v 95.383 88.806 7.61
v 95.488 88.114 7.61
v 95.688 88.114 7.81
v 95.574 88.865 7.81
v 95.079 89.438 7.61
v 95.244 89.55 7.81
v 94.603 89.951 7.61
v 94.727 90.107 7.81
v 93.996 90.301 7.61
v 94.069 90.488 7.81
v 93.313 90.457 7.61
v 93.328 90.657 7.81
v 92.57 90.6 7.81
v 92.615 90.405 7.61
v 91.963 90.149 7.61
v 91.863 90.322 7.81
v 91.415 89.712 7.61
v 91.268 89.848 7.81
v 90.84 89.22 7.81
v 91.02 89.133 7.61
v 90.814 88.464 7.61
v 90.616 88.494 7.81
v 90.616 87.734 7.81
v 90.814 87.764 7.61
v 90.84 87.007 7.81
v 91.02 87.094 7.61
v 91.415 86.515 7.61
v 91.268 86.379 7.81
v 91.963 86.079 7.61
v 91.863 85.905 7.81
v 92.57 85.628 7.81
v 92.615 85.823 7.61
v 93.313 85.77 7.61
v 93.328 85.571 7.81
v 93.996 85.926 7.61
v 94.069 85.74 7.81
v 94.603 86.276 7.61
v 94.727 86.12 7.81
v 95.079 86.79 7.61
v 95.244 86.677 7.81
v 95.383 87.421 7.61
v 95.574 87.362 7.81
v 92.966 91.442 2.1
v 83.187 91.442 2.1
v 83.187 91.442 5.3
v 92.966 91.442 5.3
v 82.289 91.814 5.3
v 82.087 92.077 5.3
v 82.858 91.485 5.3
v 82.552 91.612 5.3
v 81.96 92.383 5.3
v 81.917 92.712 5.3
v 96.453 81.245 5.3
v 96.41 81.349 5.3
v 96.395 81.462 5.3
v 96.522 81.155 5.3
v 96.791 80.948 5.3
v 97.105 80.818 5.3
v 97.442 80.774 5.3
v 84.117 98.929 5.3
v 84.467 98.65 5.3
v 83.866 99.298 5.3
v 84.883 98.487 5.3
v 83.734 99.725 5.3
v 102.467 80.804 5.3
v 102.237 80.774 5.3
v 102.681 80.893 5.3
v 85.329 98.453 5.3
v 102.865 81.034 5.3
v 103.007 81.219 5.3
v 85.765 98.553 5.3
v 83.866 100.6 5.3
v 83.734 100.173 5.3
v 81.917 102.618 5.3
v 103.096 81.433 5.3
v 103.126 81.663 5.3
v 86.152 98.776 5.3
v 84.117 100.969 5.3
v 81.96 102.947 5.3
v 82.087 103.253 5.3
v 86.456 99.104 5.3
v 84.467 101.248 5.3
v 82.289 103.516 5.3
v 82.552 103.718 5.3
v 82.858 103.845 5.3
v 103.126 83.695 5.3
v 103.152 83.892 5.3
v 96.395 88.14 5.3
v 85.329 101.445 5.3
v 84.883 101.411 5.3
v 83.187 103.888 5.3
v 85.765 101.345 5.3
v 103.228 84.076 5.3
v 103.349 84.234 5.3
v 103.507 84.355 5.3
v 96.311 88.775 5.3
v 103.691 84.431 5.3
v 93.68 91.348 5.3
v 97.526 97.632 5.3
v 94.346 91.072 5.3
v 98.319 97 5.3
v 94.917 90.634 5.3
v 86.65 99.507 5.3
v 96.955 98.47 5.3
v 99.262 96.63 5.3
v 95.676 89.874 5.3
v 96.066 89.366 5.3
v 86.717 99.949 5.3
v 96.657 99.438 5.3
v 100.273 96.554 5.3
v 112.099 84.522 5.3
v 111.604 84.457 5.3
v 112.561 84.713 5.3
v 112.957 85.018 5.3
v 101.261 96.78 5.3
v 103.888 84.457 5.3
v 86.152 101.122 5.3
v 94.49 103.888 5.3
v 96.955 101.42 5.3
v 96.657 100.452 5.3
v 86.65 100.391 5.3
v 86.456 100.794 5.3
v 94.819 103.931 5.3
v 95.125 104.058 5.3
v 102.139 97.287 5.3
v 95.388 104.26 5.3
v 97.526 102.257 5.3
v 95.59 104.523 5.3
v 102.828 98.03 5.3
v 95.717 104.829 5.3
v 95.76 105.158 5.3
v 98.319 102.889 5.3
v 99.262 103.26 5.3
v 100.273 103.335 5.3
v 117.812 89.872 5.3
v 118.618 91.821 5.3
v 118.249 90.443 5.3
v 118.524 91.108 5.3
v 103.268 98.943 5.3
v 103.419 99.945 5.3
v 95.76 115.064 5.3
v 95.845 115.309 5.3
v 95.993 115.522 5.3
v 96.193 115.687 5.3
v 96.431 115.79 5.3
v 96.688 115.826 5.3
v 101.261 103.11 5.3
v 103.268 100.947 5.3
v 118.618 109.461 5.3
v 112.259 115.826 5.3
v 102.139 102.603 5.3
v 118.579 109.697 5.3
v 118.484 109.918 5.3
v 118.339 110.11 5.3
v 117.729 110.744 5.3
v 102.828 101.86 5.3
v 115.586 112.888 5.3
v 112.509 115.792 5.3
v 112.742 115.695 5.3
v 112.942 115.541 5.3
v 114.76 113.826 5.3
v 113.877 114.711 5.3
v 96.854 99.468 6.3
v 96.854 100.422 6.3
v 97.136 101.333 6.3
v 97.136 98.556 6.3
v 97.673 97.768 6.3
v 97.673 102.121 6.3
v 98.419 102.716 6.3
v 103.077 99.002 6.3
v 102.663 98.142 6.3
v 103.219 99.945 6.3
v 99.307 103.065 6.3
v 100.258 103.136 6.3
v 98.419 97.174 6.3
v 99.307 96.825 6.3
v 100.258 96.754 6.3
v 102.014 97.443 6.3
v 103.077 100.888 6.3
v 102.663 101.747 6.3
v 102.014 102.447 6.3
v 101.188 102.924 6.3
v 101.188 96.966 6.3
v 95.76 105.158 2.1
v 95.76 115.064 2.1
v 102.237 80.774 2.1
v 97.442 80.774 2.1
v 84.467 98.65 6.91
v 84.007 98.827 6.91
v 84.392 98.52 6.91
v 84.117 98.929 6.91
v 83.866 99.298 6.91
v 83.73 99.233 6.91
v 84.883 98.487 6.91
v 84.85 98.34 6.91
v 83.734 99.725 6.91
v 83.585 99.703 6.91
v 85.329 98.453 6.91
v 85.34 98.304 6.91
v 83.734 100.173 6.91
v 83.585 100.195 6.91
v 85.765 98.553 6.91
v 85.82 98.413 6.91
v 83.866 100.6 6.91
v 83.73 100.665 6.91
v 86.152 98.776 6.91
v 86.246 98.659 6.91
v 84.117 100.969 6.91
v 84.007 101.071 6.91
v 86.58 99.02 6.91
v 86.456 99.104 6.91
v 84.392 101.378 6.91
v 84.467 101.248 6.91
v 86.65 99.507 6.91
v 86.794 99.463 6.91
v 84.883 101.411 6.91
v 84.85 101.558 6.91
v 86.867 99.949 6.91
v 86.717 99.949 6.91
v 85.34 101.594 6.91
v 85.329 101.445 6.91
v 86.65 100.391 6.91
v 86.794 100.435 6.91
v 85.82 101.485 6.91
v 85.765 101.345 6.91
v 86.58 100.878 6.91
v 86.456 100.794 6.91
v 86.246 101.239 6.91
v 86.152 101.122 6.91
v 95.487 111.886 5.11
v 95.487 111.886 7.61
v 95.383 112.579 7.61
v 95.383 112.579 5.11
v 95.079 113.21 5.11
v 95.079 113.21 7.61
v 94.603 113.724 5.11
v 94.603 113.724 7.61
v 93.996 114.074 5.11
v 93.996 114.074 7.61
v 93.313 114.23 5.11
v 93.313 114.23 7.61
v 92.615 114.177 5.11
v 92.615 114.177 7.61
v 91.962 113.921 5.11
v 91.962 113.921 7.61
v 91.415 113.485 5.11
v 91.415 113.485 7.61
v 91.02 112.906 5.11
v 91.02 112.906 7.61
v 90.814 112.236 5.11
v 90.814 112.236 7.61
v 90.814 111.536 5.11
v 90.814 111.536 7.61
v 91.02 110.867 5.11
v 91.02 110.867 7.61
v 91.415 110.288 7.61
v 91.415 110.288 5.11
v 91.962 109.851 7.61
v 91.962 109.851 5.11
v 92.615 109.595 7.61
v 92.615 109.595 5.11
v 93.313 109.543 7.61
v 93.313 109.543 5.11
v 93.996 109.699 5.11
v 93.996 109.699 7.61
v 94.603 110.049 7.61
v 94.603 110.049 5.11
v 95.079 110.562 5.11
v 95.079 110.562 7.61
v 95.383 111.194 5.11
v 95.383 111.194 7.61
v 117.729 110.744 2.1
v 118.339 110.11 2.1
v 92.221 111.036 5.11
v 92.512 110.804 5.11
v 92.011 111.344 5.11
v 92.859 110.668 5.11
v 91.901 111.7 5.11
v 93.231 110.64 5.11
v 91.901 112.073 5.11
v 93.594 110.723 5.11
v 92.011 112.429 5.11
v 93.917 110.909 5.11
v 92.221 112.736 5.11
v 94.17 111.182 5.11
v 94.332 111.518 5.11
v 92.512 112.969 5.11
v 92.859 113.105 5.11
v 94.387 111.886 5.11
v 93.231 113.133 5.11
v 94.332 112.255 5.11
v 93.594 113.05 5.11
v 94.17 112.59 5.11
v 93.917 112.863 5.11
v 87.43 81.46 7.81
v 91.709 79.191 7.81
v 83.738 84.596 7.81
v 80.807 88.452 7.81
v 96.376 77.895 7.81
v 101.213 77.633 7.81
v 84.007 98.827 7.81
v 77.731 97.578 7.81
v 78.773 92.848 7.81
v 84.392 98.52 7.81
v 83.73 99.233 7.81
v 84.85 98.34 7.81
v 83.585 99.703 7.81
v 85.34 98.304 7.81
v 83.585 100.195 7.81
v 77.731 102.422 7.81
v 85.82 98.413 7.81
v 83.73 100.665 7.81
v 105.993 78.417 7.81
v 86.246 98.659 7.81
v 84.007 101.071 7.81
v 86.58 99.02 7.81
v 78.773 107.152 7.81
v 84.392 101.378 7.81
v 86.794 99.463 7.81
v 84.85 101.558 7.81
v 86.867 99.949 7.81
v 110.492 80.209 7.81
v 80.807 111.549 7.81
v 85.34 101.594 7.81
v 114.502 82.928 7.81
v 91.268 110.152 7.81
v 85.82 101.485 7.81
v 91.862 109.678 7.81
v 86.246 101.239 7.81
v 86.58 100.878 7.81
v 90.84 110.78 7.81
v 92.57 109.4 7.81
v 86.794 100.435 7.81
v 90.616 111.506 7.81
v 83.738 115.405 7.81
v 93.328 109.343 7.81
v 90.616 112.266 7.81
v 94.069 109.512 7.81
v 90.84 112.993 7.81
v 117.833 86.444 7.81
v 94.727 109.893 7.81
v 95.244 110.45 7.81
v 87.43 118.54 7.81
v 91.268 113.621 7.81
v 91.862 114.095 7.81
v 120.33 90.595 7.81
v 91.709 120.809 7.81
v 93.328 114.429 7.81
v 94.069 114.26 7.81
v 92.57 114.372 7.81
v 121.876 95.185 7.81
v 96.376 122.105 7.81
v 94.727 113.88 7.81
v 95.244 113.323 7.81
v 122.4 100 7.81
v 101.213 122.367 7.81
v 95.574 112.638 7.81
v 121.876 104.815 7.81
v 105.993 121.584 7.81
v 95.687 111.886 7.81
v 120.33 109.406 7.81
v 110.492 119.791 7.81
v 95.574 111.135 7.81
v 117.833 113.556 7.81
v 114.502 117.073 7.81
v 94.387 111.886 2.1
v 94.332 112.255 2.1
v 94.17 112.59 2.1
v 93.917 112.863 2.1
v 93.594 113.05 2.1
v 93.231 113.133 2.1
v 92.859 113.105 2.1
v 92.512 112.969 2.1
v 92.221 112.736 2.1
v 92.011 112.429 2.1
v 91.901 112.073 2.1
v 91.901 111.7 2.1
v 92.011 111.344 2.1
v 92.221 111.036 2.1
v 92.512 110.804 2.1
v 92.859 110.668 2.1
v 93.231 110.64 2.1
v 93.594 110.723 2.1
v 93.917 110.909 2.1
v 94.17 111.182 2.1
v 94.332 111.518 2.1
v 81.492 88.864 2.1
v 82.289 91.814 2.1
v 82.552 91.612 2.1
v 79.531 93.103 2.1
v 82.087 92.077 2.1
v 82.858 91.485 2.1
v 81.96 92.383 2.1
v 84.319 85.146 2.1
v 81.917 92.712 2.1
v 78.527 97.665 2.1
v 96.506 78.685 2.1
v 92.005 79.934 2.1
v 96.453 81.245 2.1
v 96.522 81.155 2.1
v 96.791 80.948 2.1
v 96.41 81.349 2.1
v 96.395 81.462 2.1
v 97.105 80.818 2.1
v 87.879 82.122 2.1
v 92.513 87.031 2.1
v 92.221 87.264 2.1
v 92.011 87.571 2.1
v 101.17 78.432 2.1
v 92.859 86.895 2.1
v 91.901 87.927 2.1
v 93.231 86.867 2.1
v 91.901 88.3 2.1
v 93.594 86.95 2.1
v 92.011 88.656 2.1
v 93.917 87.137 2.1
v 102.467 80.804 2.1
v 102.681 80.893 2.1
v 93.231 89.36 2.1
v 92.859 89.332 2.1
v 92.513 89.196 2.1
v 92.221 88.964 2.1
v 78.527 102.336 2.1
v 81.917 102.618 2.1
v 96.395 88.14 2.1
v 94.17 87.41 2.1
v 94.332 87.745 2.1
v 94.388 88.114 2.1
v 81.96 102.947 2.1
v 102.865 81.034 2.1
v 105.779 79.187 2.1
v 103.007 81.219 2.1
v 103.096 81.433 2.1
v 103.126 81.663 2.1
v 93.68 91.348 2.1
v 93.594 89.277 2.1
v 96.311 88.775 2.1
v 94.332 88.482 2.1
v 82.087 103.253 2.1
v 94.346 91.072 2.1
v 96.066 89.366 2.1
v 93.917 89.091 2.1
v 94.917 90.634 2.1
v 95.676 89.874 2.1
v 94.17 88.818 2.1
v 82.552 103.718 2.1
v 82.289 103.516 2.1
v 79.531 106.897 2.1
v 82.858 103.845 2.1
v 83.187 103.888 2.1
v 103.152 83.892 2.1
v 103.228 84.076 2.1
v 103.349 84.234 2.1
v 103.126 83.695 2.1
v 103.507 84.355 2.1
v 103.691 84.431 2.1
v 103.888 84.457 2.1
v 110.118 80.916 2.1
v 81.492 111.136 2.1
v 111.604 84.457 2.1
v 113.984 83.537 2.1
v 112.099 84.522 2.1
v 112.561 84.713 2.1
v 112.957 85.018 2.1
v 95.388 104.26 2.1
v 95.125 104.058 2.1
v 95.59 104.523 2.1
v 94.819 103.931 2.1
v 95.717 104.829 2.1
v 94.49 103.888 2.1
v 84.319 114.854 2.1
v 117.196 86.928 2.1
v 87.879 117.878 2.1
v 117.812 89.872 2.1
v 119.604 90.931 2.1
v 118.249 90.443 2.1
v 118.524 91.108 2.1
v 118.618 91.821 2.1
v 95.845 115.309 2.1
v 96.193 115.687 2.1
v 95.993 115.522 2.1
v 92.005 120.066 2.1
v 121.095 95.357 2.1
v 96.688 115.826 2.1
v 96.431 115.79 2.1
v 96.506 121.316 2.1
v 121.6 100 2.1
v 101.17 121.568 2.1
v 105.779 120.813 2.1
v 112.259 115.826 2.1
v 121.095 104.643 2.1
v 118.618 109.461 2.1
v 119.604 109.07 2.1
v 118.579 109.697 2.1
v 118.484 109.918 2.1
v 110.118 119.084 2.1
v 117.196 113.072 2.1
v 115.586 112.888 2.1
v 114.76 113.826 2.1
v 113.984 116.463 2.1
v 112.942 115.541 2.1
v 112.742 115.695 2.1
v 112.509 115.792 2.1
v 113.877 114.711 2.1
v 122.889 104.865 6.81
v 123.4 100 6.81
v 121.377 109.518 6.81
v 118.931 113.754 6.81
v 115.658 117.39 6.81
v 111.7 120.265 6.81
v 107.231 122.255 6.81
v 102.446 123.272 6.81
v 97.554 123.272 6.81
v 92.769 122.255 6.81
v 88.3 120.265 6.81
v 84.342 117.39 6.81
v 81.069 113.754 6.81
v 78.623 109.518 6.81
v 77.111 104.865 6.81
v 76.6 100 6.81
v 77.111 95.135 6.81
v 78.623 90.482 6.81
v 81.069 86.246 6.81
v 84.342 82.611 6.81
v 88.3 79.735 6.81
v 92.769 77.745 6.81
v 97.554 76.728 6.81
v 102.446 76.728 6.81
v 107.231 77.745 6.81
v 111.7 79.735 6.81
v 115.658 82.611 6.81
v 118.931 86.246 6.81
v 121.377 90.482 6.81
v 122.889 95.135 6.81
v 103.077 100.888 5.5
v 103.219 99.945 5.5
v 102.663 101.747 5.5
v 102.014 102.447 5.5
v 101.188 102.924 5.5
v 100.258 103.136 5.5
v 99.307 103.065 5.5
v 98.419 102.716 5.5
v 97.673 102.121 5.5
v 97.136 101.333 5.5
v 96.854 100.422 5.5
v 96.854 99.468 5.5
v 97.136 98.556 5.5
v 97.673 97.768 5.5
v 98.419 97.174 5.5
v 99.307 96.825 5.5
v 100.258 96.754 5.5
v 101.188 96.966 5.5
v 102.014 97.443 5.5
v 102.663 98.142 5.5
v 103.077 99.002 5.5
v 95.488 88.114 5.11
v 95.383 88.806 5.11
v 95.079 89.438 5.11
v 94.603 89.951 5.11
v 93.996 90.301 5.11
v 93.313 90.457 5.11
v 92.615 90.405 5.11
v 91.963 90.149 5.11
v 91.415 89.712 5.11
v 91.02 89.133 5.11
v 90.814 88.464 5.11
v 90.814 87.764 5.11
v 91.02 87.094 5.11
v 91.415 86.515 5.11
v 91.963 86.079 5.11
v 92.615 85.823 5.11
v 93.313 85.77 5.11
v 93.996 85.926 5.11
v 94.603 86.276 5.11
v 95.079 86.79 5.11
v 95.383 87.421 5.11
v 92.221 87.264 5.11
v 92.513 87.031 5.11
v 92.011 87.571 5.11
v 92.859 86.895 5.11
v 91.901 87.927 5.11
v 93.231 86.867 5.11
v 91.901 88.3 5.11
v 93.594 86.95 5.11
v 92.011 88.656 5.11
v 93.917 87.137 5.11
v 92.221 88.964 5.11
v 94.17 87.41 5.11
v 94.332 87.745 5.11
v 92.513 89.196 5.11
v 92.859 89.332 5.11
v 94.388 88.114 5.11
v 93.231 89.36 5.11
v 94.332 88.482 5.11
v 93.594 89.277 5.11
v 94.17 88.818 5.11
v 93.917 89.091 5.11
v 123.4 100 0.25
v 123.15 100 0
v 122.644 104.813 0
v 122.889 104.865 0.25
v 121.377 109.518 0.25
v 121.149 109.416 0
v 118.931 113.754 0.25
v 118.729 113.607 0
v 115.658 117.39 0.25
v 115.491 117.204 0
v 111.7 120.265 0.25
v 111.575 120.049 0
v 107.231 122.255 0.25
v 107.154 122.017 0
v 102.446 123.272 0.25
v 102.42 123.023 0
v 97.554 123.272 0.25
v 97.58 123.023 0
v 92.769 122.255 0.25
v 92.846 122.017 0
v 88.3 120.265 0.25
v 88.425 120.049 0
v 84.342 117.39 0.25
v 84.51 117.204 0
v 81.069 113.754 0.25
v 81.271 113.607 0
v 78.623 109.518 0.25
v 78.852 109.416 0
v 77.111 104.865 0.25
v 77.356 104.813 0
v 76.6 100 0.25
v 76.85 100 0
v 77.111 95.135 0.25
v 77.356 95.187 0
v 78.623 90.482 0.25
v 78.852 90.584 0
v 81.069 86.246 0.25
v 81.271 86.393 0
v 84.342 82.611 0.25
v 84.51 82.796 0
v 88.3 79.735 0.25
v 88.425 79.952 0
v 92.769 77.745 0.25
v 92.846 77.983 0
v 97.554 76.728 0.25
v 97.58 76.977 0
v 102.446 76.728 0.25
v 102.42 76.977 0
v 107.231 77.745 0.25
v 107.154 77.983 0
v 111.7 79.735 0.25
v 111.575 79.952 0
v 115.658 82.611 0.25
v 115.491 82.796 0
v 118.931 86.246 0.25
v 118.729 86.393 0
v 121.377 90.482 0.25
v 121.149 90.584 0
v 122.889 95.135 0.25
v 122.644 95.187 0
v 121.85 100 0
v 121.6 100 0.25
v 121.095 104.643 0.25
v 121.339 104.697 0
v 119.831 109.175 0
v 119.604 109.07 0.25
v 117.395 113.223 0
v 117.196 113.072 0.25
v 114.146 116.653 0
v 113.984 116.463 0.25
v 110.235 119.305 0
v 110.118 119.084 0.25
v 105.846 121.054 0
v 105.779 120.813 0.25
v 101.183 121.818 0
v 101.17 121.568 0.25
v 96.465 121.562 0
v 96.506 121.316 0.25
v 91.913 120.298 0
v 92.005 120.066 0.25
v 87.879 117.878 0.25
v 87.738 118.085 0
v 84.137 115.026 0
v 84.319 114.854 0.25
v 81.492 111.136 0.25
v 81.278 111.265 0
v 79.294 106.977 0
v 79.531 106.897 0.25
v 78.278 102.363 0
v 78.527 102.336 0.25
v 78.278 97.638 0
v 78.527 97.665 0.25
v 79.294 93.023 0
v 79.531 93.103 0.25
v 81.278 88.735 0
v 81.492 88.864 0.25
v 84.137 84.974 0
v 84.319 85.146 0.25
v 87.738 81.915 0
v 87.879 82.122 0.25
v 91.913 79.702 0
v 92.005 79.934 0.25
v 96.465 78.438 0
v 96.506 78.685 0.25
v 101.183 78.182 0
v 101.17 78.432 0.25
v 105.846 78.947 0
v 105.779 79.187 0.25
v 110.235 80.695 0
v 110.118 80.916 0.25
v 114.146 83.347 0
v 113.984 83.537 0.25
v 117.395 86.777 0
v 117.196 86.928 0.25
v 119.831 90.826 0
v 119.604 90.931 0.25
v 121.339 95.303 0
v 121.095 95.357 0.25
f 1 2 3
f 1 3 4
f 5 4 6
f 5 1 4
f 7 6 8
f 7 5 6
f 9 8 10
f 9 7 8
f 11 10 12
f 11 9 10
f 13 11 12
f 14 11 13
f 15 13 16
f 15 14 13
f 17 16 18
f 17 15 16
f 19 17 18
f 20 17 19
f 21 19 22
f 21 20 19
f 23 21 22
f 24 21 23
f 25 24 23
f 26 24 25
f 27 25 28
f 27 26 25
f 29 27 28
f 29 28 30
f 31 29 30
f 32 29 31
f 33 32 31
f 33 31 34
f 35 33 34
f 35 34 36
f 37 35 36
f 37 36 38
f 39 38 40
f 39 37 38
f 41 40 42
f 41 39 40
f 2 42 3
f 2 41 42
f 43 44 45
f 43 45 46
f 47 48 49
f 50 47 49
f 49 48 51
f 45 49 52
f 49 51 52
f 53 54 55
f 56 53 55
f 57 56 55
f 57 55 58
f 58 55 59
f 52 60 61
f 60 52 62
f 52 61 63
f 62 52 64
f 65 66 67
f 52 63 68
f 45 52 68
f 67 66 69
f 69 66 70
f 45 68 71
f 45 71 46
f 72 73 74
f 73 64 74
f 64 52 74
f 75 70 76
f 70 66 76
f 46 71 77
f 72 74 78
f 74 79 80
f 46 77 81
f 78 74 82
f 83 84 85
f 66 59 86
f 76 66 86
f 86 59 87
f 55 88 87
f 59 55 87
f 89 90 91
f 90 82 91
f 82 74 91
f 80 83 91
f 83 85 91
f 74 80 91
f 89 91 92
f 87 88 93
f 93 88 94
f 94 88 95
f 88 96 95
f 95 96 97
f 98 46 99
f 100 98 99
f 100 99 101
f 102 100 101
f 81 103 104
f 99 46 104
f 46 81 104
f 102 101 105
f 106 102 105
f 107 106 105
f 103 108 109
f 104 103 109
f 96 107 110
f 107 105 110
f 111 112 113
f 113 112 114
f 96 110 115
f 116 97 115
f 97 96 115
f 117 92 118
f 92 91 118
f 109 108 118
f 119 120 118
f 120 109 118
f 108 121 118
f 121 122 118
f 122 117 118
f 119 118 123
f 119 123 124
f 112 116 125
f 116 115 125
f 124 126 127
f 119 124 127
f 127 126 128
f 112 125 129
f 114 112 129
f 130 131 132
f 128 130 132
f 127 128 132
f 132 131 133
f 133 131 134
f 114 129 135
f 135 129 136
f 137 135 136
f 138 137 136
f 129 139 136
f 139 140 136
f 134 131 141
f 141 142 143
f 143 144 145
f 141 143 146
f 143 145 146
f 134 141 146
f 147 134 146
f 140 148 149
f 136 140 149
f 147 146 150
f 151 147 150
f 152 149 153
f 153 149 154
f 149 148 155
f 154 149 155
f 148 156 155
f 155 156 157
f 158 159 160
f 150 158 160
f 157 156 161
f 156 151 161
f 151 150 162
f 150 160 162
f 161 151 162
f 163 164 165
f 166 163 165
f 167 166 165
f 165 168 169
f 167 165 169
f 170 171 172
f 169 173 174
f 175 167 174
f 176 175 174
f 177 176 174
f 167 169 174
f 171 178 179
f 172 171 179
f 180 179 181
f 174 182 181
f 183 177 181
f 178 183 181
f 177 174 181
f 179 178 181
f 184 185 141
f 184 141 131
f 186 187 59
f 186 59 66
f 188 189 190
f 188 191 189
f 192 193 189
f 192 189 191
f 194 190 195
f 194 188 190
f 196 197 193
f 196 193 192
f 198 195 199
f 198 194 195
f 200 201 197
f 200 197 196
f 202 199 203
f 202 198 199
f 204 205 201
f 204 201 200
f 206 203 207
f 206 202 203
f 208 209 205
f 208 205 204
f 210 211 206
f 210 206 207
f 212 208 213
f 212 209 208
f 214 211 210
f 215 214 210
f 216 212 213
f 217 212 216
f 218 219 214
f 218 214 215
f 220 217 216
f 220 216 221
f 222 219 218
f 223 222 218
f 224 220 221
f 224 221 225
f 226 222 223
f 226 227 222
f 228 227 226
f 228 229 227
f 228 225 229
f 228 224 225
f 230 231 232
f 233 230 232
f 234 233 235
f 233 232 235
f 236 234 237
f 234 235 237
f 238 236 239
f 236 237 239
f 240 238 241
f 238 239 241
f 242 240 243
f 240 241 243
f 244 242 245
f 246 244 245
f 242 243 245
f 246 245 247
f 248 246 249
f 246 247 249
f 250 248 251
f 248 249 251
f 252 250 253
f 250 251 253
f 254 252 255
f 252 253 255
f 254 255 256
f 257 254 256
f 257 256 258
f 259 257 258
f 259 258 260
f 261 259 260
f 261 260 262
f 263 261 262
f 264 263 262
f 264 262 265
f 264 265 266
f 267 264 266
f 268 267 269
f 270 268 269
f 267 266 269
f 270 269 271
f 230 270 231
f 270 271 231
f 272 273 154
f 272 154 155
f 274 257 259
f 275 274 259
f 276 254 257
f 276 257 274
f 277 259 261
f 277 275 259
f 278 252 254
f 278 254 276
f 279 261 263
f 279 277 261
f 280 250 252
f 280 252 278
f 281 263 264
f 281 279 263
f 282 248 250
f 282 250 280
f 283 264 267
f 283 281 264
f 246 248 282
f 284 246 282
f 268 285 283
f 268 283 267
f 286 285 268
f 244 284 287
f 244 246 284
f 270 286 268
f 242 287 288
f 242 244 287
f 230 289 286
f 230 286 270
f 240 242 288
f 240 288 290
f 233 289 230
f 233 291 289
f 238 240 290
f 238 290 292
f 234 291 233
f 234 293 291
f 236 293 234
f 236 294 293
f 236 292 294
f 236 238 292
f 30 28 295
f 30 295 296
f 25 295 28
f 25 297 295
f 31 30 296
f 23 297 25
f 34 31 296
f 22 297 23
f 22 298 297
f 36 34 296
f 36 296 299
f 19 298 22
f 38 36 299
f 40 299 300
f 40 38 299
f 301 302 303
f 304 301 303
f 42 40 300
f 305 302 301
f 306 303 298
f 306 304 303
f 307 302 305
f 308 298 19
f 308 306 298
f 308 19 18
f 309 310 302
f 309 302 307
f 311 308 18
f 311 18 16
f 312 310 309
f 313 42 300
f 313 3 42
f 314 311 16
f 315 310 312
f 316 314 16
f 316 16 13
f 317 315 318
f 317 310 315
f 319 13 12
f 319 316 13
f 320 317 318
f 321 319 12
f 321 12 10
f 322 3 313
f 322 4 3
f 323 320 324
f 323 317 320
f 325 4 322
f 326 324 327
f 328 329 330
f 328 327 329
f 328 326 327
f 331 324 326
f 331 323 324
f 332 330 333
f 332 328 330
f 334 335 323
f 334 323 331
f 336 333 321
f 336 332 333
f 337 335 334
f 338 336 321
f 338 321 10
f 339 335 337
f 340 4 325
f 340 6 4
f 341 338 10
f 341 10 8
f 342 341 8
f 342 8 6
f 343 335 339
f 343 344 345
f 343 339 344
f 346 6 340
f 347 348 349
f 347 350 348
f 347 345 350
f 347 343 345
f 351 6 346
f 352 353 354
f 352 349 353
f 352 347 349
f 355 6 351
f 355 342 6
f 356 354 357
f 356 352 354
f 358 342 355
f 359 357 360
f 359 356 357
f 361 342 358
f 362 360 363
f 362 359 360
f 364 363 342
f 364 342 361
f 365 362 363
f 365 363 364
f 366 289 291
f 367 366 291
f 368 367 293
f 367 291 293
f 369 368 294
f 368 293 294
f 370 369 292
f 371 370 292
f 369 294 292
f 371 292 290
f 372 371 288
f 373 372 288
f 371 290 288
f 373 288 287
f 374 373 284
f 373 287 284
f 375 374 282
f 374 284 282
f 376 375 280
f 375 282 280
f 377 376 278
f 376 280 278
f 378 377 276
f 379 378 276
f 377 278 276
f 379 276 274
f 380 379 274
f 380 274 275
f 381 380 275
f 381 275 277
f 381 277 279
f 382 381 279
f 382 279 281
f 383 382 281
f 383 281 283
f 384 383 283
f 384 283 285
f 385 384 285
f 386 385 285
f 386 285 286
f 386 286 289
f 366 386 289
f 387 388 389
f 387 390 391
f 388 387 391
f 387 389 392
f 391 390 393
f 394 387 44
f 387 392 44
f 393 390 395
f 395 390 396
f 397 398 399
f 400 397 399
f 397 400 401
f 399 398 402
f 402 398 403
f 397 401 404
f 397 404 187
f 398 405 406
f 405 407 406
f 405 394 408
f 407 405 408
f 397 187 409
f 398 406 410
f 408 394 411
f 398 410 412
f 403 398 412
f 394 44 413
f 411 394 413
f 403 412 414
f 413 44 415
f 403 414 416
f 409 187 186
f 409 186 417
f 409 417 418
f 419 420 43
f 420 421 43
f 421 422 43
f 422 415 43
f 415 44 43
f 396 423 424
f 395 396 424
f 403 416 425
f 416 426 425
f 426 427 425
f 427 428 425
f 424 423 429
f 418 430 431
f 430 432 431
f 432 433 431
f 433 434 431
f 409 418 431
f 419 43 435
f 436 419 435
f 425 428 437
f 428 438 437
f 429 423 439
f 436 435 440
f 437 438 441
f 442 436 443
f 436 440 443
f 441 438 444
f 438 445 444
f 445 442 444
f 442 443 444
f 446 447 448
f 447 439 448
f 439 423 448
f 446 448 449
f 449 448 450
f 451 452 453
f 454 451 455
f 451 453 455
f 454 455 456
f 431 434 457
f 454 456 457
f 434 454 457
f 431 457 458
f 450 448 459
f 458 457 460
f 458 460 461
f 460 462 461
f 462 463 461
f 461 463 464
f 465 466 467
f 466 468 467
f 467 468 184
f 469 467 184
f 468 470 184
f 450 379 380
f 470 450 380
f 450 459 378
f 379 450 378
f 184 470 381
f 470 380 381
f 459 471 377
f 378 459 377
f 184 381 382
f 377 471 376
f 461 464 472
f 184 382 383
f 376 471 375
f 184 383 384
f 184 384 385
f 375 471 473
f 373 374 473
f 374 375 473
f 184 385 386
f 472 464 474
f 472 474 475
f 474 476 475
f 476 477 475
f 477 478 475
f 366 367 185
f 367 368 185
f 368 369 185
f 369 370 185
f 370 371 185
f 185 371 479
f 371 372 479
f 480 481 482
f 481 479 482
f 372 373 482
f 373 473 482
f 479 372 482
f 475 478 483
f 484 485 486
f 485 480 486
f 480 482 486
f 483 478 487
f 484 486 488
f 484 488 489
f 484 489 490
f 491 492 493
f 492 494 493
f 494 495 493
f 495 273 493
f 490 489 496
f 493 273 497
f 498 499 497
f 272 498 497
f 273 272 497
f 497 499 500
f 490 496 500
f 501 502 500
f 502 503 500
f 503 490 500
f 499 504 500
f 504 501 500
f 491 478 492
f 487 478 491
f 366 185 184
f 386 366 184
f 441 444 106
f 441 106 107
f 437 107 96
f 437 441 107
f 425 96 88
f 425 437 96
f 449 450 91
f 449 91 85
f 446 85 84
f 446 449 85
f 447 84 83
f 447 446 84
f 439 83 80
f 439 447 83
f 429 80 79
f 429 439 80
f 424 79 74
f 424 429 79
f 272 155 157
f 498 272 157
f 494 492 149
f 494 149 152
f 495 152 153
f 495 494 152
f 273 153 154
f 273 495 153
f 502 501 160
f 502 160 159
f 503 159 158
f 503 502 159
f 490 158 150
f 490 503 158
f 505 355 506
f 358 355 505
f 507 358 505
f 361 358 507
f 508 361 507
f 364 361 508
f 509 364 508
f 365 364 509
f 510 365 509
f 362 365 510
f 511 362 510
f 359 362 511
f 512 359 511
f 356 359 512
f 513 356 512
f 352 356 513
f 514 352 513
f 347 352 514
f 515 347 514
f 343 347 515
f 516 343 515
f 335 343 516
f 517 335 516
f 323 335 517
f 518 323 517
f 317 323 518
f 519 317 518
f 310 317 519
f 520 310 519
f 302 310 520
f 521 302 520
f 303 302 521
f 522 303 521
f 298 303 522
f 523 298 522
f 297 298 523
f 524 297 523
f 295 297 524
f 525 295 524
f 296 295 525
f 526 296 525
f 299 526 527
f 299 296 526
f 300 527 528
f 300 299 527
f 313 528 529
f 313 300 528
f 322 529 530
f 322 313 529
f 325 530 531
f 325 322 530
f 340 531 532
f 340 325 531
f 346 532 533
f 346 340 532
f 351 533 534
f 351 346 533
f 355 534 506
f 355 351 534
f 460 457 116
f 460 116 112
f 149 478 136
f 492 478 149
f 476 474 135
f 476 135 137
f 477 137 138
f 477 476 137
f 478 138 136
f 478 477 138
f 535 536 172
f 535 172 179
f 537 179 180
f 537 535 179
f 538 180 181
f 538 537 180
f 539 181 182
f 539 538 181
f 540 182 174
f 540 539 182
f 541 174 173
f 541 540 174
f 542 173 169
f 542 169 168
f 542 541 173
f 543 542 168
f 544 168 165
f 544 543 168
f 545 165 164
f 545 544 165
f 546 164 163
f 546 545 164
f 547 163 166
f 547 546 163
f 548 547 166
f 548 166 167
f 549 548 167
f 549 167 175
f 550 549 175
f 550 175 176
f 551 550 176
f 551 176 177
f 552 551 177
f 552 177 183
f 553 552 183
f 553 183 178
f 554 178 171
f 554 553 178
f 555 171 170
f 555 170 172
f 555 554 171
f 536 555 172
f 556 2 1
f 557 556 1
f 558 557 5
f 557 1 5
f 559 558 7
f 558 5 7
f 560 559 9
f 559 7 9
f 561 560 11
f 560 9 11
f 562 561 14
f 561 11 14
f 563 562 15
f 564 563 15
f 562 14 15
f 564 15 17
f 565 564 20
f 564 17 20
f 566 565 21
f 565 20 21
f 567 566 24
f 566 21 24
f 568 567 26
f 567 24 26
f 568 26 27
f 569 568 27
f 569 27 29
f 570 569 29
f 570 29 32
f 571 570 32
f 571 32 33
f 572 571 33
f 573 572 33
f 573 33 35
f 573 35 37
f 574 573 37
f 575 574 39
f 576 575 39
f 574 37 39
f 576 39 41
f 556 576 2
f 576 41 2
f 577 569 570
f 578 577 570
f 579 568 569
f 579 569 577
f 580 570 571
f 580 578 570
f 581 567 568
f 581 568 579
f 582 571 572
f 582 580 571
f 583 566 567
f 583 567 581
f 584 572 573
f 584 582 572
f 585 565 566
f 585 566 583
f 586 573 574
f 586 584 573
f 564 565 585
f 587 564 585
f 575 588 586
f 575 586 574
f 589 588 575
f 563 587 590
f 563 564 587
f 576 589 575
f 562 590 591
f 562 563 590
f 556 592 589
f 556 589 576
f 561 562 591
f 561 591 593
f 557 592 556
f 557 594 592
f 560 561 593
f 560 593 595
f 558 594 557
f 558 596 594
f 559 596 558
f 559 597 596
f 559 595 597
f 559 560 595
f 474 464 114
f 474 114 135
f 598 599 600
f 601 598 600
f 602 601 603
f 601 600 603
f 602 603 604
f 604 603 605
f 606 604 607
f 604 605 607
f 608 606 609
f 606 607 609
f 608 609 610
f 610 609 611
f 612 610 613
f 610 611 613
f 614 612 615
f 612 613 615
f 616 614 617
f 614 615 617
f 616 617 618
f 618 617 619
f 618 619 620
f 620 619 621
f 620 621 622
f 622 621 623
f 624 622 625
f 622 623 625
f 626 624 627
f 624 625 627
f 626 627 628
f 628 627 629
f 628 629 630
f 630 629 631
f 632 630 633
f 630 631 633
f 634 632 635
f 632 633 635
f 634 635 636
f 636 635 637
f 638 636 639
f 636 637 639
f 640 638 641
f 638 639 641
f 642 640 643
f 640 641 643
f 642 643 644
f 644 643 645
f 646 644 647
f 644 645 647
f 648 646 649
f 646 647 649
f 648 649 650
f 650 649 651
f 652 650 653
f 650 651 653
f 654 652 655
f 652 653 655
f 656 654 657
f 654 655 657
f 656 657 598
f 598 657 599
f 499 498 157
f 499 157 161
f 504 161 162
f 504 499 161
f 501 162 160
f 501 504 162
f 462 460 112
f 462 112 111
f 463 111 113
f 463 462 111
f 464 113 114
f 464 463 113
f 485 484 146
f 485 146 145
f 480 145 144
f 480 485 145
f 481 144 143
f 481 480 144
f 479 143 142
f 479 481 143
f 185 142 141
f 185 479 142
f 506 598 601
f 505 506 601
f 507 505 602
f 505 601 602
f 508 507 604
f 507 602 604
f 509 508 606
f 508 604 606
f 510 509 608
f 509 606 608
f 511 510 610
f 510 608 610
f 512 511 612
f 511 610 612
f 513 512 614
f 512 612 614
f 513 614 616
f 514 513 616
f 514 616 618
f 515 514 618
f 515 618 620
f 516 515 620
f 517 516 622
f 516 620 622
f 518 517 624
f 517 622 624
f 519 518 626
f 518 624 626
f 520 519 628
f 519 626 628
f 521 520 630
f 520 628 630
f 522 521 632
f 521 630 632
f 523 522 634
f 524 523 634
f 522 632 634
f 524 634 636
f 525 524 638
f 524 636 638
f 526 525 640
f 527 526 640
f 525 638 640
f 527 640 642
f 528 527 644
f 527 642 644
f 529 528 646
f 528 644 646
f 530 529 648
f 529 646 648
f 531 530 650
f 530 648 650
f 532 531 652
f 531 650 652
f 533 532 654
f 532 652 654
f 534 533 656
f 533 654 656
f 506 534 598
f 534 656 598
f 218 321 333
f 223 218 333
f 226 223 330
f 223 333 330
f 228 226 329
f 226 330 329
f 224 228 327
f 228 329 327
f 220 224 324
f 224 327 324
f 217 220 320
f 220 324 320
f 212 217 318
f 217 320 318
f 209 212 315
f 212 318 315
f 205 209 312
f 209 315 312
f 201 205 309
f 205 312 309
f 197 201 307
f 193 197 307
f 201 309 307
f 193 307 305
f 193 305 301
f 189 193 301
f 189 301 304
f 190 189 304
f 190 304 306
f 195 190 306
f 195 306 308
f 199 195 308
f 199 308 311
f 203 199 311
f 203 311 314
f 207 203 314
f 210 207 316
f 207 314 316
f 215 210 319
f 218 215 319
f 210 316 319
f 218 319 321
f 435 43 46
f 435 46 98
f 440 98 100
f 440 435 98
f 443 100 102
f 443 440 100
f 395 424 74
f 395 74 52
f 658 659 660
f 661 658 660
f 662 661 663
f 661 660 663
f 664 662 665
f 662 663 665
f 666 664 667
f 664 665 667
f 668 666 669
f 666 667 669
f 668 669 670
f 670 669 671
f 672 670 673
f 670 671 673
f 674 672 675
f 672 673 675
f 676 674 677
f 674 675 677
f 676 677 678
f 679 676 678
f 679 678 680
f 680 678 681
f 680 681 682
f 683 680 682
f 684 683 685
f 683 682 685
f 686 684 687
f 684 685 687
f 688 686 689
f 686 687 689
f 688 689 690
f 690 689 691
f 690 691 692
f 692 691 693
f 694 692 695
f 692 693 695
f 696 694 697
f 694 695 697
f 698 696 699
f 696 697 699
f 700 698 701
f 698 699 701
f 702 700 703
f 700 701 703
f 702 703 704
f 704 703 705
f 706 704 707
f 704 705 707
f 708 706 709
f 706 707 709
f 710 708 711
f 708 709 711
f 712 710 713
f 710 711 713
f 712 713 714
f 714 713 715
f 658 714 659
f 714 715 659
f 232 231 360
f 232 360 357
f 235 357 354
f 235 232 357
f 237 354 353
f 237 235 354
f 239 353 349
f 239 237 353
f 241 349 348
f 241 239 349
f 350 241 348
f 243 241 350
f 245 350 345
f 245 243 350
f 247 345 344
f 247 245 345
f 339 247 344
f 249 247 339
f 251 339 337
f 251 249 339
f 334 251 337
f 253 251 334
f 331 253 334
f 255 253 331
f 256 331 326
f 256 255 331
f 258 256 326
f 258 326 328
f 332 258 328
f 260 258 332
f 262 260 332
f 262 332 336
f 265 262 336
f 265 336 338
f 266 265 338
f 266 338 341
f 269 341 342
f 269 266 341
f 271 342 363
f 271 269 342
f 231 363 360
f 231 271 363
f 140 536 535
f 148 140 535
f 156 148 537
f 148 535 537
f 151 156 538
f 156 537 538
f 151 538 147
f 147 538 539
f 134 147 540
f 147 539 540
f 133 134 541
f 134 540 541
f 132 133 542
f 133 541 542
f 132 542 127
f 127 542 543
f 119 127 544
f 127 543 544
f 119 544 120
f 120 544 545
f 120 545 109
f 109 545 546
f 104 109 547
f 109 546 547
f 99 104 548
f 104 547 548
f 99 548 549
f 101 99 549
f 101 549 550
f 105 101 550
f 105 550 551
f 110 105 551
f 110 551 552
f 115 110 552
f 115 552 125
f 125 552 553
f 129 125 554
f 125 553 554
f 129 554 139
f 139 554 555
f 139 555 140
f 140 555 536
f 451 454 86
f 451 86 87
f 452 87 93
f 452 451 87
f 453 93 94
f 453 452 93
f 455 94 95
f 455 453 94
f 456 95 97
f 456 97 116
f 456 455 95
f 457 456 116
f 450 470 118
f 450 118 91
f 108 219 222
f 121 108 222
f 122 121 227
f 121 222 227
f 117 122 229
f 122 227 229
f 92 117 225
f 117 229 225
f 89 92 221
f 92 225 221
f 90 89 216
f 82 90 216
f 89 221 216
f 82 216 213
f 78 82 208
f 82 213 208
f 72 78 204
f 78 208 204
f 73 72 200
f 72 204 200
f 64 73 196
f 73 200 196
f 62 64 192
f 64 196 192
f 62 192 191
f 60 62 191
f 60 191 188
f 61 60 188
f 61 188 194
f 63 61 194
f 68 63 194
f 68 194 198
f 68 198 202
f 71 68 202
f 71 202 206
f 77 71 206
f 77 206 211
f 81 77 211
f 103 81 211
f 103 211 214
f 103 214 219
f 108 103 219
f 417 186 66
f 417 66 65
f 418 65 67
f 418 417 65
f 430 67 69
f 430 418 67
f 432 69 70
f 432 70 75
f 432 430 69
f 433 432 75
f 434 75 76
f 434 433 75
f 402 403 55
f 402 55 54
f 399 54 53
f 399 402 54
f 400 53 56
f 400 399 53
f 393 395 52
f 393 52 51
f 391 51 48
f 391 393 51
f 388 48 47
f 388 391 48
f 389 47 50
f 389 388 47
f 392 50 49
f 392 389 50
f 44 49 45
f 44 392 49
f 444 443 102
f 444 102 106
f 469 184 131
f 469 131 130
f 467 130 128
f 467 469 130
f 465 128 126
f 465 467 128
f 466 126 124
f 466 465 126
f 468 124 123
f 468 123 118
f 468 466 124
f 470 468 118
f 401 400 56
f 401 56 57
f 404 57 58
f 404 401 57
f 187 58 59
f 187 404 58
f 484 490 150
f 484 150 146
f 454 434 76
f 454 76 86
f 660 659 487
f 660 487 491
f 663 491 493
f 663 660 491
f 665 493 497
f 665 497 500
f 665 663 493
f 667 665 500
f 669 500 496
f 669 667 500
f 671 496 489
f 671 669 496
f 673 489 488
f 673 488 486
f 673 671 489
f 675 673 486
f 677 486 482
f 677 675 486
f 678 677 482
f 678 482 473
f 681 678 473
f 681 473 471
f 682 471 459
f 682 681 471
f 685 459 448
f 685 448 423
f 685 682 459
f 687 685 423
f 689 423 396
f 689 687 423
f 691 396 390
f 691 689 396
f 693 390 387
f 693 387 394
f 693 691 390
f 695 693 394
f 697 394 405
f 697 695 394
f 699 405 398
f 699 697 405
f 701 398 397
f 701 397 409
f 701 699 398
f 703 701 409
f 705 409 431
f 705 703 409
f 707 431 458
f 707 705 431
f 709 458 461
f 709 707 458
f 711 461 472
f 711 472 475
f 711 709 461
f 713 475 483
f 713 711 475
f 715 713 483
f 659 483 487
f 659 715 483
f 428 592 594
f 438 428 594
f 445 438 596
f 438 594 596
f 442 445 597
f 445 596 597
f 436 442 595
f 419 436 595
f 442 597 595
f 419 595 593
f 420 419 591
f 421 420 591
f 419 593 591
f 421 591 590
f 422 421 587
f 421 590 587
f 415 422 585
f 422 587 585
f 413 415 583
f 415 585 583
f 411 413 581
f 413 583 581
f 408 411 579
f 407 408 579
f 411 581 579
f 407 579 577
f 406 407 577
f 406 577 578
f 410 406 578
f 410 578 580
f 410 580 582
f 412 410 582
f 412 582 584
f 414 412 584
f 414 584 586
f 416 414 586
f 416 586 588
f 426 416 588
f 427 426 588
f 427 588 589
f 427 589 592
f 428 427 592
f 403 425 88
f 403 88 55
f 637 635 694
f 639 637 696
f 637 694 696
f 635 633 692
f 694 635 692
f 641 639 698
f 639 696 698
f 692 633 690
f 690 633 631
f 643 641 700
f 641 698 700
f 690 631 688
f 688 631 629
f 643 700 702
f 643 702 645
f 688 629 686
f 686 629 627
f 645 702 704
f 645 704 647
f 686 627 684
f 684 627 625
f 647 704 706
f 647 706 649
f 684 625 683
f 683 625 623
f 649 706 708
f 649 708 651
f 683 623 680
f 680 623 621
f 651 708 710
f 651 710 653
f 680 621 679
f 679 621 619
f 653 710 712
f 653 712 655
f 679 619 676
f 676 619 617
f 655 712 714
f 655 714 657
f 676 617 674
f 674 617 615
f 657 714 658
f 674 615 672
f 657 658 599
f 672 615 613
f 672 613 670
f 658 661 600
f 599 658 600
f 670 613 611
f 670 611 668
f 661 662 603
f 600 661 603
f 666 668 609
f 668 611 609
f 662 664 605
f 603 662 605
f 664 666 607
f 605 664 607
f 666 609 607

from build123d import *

# Parameters (mm, degrees)
SKETCH_3_R          = 23.4
EXTRUDE_1_DEPTH     = 7.81
SKETCH_2_R          = 21.6
CUT_EXTRUDE_1_DEPTH = 2.1
CUT_EXTRUDE_START   = 2.1
CUT_EXTRUDE_2_DEPTH = 3.2
CUT_EXTRUDE_START_2 = 7.81
SKETCH_4_R          = 1.49999954
SKETCH_4_R_2        = 1.25000004
CUT_EXTRUDE_5_DEPTH = 8.81
SKETCH_5_R          = 1.65
CUT_EXTRUDE_6_DEPTH = 0.9
SKETCH_6_R          = 2.35
CUT_EXTRUDE_7_DEPTH = 2.7
CUT_EXTRUDE_START_3 = 5.3
SKETCH_7_R          = 3.2
CUT_EXTRUDE_8_DEPTH = 1
CHAMFER_1_SIZE      = 1
CHAMFER_2_SIZE      = 0.25
CHAMFER_3_SIZE      = 0.2


with BuildPart() as part:
    # 草图3 → 凸台-拉伸1 (new body)
    with BuildSketch(Plane.XY):
        with Locations((100.000148425, 100.000129687)):
            Circle(SKETCH_3_R)
    extrude(amount=EXTRUDE_1_DEPTH)

    # 草图2 → 切除-拉伸1 (cut)
    with BuildSketch(Plane.XY):
        with Locations((100.000148425, 100.000129687)):
            Circle(SKETCH_2_R)
    extrude(amount=CUT_EXTRUDE_1_DEPTH, mode=Mode.SUBTRACT)

    # 草图1 → 切除-拉伸2 (cut)
    with BuildSketch(Plane.XY.offset(CUT_EXTRUDE_START)):
        with BuildLine():
            Line((112.259115553, 115.826027875), (111.656637713, 115.826027875))
            Line((111.656637713, 115.826027875), (97.599477613, 115.826027875))
            Line((97.599477613, 115.826027875), (96.687659742, 115.826027875))
            ThreePointArc((96.687659742, 115.826027875), (96.087351408, 115.611111205), (95.759847053, 115.064027875))
            Line((95.759847053, 115.064027875), (95.759847053, 109.857027875))
            Line((95.759847053, 109.857027875), (95.759847053, 105.158027875))
            ThreePointArc((95.759847053, 105.158027875), (95.387872666, 104.260002263), (94.489847053, 103.888027875))
            Line((94.489847053, 103.888027875), (83.186847053, 103.888027875))
            ThreePointArc((83.186847053, 103.888027875), (82.288821441, 103.516053487), (81.916847053, 102.618027875))
            Line((81.916847053, 102.618027875), (81.916847053, 92.712027875))
            ThreePointArc((81.916847053, 92.712027875), (82.288821441, 91.814002263), (83.186847053, 91.442027875))
            Line((83.186847053, 91.442027875), (92.965847053, 91.442027875))
            ThreePointArc((92.965847053, 91.442027875), (94.021841281, 91.231977601), (94.917069973, 90.633804955))
            Line((94.917069973, 90.633804955), (95.676425833, 89.874449095))
            ThreePointArc((95.676425833, 89.874449095), (96.208135359, 89.078689918), (96.394847053, 88.140027875))
            Line((96.394847053, 88.140027875), (96.394847053, 81.461633815))
            ThreePointArc((96.394847053, 81.461633815), (96.427853197, 81.29569991), (96.521847053, 81.155027875))
            ThreePointArc((96.521847053, 81.155027875), (96.943861908, 80.87304655), (97.441662377, 80.774027875))
            Line((97.441662377, 80.774027875), (97.537847053, 80.774027875))
            Line((97.537847053, 80.774027875), (101.772425833, 80.774027875))
            Line((101.772425833, 80.774027875), (102.236847053, 80.774027875))
            ThreePointArc((102.236847053, 80.774027875), (102.865464982, 81.034409947), (103.125847053, 81.663027875))
            Line((103.125847053, 81.663027875), (103.125847053, 83.695027875))
            ThreePointArc((103.125847053, 83.695027875), (103.349031686, 84.233843243), (103.887847053, 84.457027875))
            Line((103.887847053, 84.457027875), (111.60403053, 84.457027875))
            ThreePointArc((111.60403053, 84.457027875), (112.336497489, 84.602724612), (112.957452993, 85.017633815))
            Line((112.957452993, 85.017633815), (117.811624454, 89.871805276))
            ThreePointArc((117.811624454, 89.871805276), (118.408450098, 90.766392606), (118.618000745, 91.821179725))
            Line((118.618000745, 91.821179725), (118.618000745, 108.839))
            Line((118.618000745, 108.839), (118.618000745, 109.460547459))
            ThreePointArc((118.618000745, 109.460547459), (118.537945969, 109.810671539), (118.33936792, 110.109941312))
            Line((118.33936792, 110.109941312), (117.729, 110.744000093))
            Line((117.729, 110.744000093), (115.585546543, 112.887726165))
            ThreePointArc((115.585546543, 112.887726165), (114.325244429, 114.275507158), (112.941853583, 115.540626625))
            ThreePointArc((112.941853583, 115.540626625), (112.628834267, 115.751145515), (112.259115553, 115.826027875))
        make_face()
    extrude(amount=CUT_EXTRUDE_2_DEPTH, mode=Mode.SUBTRACT)

    # 草图4 → 切除-拉伸5 (cut, through all)
    with BuildSketch(Plane.XY.offset(CUT_EXTRUDE_START_2)):
        with Locations((85.217, 99.949)):
            Circle(SKETCH_4_R)
        with Locations((93.13750232, 88.11380142)):
            Circle(SKETCH_4_R_2)
        with Locations((93.13749978, 111.8861999)):
            Circle(SKETCH_4_R_2)
    extrude(amount=-CUT_EXTRUDE_5_DEPTH, mode=Mode.SUBTRACT)

    # 草图5 → 切除-拉伸6 (cut)
    with BuildSketch(Plane.XY.offset(CUT_EXTRUDE_START_2)):
        with Locations((85.217, 99.949)):
            Circle(SKETCH_5_R)
    extrude(amount=-CUT_EXTRUDE_6_DEPTH, mode=Mode.SUBTRACT)

    # 草图6 → 切除-拉伸7 (cut)
    with BuildSketch(Plane.XY.offset(CUT_EXTRUDE_START_2)):
        with Locations((93.13749978, 111.8861999)):
            Circle(SKETCH_6_R)
        with Locations((93.13750232, 88.11380142)):
            Circle(SKETCH_6_R)
    extrude(amount=-CUT_EXTRUDE_7_DEPTH, mode=Mode.SUBTRACT)

    # 草图7 → 切除-拉伸8 (cut)
    with BuildSketch(Plane.XY.offset(CUT_EXTRUDE_START_3)):
        with Locations((100.018718989, 99.944811263)):
            Circle(SKETCH_7_R)
    extrude(amount=CUT_EXTRUDE_8_DEPTH, mode=Mode.SUBTRACT)

    # 倒角1
    chamfer_1_edges = [part.edges().sort_by_distance(p)[0] for p in [
        (76.600148425, 100.000129687, 7.81),
    ]]
    chamfer(chamfer_1_edges, length=CHAMFER_1_SIZE)

    # 倒角2
    chamfer_2_edges = [part.edges().sort_by_distance(p)[0] for p in [
        (76.600148425, 100.000129687, 0),
        (78.400148425, 100.000129687, 0),
    ]]
    chamfer(chamfer_2_edges, length=CHAMFER_2_SIZE)

    # 倒角3
    chamfer_3_edges = [part.edges().sort_by_distance(p)[0] for p in [
        (90.78749978, 111.8861999, 7.81),
        (90.78750232, 88.11380142, 7.81),
        (96.818718989, 99.944811263, 5.3),
    ]]
    chamfer(chamfer_3_edges, length=CHAMFER_3_SIZE)


solid = part.part
